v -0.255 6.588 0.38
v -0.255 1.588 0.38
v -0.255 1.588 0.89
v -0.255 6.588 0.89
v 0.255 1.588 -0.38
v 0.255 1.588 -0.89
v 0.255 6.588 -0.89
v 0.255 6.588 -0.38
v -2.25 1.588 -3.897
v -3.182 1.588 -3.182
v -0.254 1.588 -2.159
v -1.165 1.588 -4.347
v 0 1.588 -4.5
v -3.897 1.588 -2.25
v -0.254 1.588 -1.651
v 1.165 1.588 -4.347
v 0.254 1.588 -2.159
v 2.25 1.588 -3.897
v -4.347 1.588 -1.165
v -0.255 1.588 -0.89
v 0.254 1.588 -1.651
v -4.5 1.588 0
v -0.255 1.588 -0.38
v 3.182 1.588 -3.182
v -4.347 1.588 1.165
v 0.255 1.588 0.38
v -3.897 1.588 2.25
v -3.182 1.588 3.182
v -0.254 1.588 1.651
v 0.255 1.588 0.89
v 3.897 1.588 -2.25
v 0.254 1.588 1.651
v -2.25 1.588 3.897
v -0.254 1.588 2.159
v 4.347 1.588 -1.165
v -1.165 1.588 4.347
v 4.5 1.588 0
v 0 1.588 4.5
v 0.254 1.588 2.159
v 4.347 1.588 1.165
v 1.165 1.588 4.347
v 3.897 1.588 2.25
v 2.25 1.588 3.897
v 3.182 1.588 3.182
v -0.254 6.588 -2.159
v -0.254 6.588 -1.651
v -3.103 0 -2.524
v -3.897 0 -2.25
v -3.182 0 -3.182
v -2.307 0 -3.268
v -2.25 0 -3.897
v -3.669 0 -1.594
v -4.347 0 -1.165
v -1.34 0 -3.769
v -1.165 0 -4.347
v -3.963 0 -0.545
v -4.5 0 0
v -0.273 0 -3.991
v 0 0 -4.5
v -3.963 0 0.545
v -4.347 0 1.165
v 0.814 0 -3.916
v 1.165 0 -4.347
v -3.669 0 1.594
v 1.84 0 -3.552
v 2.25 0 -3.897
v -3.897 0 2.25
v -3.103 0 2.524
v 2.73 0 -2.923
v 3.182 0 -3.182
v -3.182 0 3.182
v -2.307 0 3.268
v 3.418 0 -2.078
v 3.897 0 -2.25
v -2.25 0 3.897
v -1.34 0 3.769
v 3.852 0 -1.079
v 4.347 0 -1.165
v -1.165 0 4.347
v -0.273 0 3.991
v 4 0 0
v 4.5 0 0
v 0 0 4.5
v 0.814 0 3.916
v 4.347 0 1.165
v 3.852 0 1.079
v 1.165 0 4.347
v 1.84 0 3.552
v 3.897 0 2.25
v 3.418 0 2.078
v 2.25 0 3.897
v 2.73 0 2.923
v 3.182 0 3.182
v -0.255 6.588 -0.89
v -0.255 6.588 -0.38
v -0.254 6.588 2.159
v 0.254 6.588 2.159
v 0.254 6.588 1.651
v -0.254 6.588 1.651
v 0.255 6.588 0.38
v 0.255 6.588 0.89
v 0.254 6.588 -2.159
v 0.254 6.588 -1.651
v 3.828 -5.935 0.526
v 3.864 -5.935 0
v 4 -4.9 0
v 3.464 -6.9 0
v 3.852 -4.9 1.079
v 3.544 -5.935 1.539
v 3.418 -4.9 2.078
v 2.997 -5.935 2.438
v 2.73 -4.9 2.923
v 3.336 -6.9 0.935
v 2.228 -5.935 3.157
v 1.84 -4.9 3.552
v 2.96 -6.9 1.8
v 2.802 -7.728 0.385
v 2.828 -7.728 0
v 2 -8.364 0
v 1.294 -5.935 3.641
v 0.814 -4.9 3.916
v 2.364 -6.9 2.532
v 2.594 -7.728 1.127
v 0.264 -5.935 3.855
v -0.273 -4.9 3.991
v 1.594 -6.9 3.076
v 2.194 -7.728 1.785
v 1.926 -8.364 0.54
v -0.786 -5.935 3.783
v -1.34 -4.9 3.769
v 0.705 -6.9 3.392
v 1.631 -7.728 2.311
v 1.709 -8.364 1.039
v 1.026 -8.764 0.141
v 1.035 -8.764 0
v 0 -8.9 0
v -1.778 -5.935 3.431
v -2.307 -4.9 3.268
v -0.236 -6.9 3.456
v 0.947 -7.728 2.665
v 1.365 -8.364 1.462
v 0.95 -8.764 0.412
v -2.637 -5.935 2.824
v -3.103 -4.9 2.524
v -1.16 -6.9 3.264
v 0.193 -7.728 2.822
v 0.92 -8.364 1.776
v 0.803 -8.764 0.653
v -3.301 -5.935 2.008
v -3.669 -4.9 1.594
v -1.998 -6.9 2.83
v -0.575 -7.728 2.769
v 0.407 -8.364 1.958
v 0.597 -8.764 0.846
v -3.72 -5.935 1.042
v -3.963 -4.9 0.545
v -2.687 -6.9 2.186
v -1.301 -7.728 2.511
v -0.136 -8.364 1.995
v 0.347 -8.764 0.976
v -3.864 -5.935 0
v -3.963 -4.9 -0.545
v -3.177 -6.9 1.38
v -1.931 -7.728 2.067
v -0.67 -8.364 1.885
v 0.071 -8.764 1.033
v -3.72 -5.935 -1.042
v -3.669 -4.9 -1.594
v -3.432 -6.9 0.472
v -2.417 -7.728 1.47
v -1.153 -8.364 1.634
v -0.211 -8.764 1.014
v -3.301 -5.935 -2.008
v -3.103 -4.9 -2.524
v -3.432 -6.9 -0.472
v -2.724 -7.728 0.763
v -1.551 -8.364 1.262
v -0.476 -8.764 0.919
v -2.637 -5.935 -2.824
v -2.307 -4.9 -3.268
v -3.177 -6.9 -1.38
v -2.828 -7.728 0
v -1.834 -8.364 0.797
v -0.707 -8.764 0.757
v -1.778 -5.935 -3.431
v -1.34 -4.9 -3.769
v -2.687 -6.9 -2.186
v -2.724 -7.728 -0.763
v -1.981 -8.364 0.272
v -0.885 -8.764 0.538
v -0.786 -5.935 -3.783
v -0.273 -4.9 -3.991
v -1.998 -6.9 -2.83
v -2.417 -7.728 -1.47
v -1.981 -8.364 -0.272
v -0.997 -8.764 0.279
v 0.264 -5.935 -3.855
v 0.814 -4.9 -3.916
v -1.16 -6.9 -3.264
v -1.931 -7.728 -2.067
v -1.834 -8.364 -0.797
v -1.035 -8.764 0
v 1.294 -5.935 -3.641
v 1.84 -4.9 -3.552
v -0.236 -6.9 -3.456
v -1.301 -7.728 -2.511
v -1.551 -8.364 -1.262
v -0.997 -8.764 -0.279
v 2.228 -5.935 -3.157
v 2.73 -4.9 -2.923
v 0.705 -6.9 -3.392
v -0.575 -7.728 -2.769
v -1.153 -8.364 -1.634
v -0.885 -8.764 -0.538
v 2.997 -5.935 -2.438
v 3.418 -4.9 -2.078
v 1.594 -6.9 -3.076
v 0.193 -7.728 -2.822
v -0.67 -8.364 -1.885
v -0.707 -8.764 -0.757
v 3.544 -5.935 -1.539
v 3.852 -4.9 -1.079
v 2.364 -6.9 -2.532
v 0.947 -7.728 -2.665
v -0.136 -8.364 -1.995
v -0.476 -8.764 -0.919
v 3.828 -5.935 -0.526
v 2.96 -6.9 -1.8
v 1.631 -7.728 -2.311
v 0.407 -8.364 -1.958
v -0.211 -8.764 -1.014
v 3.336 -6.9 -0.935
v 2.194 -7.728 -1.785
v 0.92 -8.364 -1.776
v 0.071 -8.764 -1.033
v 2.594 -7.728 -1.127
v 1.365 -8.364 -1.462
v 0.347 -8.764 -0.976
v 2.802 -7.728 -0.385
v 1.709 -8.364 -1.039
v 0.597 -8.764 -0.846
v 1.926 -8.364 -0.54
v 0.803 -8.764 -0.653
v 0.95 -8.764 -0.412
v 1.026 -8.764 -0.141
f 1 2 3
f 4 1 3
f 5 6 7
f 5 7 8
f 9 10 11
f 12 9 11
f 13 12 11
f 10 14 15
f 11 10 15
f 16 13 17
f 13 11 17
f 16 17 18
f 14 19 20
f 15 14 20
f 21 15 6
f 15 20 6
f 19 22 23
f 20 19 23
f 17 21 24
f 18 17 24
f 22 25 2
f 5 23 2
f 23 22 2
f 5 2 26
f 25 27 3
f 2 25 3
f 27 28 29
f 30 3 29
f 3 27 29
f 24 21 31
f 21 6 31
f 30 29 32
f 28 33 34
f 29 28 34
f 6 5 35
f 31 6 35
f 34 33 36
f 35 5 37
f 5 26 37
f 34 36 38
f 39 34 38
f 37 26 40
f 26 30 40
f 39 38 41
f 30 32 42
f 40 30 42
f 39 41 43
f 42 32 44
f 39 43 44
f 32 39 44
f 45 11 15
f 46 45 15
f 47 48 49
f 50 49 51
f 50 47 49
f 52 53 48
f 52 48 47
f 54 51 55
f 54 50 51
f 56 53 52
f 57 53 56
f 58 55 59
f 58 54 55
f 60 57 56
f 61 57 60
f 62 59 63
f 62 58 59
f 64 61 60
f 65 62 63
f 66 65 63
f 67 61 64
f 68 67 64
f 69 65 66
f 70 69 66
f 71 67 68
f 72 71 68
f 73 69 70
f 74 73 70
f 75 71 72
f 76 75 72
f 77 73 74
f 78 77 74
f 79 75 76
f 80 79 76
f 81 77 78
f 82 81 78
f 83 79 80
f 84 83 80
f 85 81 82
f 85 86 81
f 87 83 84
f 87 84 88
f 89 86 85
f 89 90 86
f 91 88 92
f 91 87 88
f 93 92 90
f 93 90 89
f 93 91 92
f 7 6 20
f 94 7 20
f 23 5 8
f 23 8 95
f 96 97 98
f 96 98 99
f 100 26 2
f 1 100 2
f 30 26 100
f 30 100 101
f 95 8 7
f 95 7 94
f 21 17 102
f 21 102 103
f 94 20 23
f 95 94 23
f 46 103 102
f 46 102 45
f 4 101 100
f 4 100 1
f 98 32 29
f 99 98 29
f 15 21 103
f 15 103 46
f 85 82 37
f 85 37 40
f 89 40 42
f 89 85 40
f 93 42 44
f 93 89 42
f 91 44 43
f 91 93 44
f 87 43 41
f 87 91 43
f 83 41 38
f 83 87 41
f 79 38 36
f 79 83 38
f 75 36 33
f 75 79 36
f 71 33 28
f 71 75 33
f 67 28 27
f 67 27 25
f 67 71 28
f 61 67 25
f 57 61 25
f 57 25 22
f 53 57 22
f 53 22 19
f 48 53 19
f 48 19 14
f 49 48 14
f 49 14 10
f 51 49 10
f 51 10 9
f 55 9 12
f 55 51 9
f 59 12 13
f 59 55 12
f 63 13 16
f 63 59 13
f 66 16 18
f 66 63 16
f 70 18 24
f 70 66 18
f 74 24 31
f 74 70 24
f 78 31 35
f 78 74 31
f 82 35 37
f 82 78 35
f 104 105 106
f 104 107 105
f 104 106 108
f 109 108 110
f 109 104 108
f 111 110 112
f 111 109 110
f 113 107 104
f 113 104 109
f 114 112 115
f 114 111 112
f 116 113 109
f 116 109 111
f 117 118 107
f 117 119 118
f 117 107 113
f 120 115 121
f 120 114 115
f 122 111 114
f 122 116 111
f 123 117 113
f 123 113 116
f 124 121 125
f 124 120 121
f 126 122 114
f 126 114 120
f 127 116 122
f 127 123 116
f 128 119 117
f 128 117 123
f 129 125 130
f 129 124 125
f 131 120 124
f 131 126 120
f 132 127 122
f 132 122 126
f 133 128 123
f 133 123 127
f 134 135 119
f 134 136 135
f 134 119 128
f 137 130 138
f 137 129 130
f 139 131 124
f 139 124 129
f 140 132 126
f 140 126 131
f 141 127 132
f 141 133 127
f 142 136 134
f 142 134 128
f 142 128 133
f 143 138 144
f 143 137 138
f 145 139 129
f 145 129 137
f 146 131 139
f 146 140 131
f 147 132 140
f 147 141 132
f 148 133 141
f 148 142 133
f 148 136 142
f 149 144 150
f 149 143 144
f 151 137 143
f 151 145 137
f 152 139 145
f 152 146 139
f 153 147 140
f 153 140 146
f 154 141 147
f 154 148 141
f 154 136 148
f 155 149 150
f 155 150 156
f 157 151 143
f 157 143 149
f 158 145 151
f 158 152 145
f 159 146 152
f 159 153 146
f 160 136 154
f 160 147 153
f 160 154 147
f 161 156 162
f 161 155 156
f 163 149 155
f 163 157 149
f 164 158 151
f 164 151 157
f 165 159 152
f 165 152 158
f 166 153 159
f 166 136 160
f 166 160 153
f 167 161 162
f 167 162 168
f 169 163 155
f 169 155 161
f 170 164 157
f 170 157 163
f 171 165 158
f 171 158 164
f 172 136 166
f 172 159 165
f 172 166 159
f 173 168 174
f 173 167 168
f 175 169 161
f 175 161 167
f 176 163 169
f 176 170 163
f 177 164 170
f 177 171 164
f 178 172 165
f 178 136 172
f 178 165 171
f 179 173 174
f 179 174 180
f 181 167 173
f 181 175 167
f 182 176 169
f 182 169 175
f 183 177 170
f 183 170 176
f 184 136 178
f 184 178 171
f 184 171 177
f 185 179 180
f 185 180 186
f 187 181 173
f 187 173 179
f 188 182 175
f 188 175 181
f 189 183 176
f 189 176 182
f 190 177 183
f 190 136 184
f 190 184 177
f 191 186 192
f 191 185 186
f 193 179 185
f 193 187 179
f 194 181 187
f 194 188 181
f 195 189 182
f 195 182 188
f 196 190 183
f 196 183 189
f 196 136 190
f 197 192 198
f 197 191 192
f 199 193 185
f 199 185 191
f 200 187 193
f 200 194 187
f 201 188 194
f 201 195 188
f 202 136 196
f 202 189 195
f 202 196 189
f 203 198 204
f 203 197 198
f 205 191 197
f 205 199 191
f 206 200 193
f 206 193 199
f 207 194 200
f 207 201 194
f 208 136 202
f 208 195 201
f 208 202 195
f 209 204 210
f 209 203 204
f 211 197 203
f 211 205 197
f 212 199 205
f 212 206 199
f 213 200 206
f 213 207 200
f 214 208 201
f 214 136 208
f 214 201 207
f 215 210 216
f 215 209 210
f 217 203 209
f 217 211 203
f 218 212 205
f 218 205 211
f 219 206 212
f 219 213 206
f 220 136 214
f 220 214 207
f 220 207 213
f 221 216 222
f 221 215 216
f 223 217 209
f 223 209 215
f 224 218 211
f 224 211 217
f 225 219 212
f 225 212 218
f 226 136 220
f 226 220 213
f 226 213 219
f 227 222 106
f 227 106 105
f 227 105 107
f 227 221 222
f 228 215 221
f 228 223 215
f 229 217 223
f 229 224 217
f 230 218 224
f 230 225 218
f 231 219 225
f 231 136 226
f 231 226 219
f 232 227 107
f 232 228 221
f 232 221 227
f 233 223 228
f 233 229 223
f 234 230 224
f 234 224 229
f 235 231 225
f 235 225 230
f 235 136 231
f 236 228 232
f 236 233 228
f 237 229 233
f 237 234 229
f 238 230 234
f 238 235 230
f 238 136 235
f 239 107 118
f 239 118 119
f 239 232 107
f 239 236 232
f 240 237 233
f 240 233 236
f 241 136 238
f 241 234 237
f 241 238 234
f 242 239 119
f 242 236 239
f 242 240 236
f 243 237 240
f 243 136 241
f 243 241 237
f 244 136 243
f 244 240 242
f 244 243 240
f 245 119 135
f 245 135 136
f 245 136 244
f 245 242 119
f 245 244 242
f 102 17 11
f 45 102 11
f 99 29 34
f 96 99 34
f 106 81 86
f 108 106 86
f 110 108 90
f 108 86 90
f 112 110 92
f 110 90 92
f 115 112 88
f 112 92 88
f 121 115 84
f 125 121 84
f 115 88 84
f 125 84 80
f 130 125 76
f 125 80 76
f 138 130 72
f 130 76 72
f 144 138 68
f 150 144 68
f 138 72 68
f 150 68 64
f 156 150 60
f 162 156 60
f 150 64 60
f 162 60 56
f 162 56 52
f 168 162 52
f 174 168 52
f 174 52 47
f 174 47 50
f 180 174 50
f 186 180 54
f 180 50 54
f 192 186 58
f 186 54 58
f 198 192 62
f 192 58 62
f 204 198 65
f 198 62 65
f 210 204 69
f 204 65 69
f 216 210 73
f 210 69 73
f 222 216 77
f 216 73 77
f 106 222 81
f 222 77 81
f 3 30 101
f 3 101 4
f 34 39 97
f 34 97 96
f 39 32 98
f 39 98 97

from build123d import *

# Parameters (mm, degrees)
F0_R     = 4.5
F0_R_2   = 4
F1_DEPTH = 1.5875
F2_R     = 4
F3_DEPTH = 8.9
F4_R     = 4
F5_W     = 0.508
F5_H     = 0.508
F5_W_2   = 0.51
F5_H_2   = 0.51
F6_DEPTH = 5


with BuildPart() as f1:
    # F0 (on Front) → F1 (new body)
    with BuildSketch(Plane.XZ):
        Circle(F0_R)
        Circle(F0_R_2, mode=Mode.SUBTRACT)
        Circle(F0_R_2)
    extrude(amount=-F1_DEPTH)

    # F2 (on face) → F3 (join)
    with BuildSketch(Plane.XZ):
        Circle(F2_R)
    extrude(amount=F3_DEPTH)

    # F4
    f4_edges = [f1.edges().sort_by_distance(p)[0] for p in [
        (-4, -8.9, 0),
    ]]
    fillet(f4_edges, radius=F4_R)

    # F5 (on face) → F6 (join)
    with BuildSketch(Plane(origin=(0, 1.5875, 0), x_dir=(-1, 0, 0), z_dir=(0, 1, 0))):
        with Locations((0, 1.905)):
            Rectangle(F5_W, F5_H)
        with Locations((0, 0.635)):
            Rectangle(F5_W_2, F5_H_2)
        with Locations((0, -0.635)):
            Rectangle(F5_W_2, F5_H_2)
        with Locations((0, -1.905)):
            Rectangle(F5_W, F5_H)
    extrude(amount=F6_DEPTH)


solid = f1.part
